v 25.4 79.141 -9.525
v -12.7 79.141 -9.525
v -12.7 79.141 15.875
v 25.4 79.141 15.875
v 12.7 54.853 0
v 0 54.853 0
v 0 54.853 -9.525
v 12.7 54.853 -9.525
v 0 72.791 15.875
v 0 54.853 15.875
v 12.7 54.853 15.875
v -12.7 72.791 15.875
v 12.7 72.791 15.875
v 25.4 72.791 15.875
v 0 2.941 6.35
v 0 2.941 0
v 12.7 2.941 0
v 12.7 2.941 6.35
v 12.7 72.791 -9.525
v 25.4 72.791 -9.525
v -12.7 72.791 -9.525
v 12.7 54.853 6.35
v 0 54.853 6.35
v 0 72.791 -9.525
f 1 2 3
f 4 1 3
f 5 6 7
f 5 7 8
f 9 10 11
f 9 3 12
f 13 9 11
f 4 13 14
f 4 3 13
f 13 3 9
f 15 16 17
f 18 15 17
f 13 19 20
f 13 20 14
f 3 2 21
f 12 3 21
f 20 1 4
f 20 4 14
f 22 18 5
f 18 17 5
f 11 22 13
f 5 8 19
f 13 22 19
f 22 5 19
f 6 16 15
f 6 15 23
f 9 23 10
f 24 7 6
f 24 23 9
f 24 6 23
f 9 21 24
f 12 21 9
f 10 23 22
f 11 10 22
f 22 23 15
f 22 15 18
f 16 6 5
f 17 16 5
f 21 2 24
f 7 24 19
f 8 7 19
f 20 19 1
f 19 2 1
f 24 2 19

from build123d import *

# Parameters (mm, degrees)
F0_W          = 12.7
F0_H          = 76.2
F1_DEPTH      = 6.35
F2_W          = 6.35
F2_H          = 25.4
F3_DEPTH      = 12.7
F3_DEPTH_BACK = 25.4
F4_W          = 12.7
F4_H          = 17.9375
F5_DEPTH      = 9.525
F5_DEPTH_BACK = 15.875


with BuildPart() as f1:
    # F0 (on Top) → F1 (new body)
    with BuildSketch(Plane.XY):
        with Locations((6.35, 41.040604)):
            Rectangle(F0_W, F0_H)
    extrude(amount=F1_DEPTH)

    # F2 (on face) → F3 (join, two sides)
    with BuildSketch(Plane(origin=(0, 0, 0), x_dir=(0, -1, 0), z_dir=(-1, 0, 0))) as f3_sk:
        with Locations((-75.965604, 3.175)):
            Rectangle(F2_W, F2_H)
    extrude(amount=F3_DEPTH)
    extrude(f3_sk.sketch, amount=-F3_DEPTH_BACK)

    # F4 (on face) → F5 (join, two sides)
    with BuildSketch(Plane.XY.offset(6.35)) as f5_sk:
        with Locations((6.35, 63.821854)):
            Rectangle(F4_W, F4_H)
    extrude(amount=F5_DEPTH)
    extrude(f5_sk.sketch, amount=-F5_DEPTH_BACK)


solid = f1.part
